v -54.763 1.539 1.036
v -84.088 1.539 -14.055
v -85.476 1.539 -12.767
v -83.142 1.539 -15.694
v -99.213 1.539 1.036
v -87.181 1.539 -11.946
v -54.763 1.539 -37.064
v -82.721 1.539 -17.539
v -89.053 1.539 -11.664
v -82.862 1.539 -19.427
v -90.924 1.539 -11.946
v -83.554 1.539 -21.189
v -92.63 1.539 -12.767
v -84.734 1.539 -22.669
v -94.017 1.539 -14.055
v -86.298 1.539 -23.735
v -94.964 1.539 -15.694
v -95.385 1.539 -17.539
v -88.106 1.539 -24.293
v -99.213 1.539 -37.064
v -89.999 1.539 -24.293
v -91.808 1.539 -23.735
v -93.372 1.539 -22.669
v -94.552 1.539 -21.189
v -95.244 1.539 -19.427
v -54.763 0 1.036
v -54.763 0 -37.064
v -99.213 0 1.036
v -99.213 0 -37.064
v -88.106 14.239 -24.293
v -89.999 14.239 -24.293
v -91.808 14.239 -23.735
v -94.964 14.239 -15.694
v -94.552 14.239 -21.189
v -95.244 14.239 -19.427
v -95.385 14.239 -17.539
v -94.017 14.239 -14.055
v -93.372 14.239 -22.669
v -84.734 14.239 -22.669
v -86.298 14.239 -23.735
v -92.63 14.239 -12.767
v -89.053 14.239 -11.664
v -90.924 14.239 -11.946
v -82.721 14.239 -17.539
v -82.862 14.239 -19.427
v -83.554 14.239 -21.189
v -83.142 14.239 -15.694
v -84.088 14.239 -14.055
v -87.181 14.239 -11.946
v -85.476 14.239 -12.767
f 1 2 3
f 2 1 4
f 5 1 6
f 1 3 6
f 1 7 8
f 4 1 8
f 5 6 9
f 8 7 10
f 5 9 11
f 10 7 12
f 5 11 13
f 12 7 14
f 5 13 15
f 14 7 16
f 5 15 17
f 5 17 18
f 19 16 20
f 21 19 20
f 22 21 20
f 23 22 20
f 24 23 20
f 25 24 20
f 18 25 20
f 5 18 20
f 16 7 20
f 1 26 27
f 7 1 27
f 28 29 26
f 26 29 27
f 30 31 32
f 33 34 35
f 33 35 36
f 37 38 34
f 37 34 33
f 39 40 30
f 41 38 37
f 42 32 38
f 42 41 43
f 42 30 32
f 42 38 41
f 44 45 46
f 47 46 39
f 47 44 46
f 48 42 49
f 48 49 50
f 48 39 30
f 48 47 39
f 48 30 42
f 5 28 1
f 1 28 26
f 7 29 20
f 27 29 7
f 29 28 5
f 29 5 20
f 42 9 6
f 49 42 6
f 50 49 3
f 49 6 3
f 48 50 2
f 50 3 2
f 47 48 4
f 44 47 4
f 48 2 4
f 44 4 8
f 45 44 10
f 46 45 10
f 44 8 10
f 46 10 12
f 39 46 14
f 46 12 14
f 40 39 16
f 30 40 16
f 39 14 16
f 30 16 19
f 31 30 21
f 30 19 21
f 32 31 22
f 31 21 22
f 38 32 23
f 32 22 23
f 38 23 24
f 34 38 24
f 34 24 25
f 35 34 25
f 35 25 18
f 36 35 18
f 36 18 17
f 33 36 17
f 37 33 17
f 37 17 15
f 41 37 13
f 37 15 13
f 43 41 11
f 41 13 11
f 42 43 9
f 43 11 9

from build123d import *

# Parameters (mm, degrees)
SKETCH1_W           = 44.45
SKETCH1_H           = 38.1
BOSS_EXTRUDE1_DEPTH = 12.7
SKETCH4_W           = 44.45
SKETCH4_H           = 11.16076
CUT_EXTRUDE1_DEPTH  = 108.033044593
SKETCH5_R           = 6.35
BOSS_EXTRUDE2_DEPTH = 12.7


with BuildPart() as part:
    # Sketch1 → Boss-Extrude1 (new body)
    with BuildSketch(Plane(origin=(0, 0, 0), x_dir=(1, 0, 0), z_dir=(0, 1, 0))):
        with Locations((-76.987764476, 18.013859456)):
            Rectangle(SKETCH1_W, SKETCH1_H)
    extrude(amount=BOSS_EXTRUDE1_DEPTH)

    # Sketch4 → Cut-Extrude1 (cut, through all)
    with BuildSketch(Plane(origin=(0, 0, -37.063859456), x_dir=(-1, 0, 0), z_dir=(0, 0, -1))):
        with Locations((76.987764476, 7.11962)):
            Rectangle(SKETCH4_W, SKETCH4_H)
    extrude(amount=-CUT_EXTRUDE1_DEPTH, mode=Mode.SUBTRACT)

    # Sketch5 → Boss-Extrude2 (add)
    with BuildSketch(Plane(origin=(0, 1.53924, 0), x_dir=(1, 0, 0), z_dir=(0, 1, 0))):
        with Locations(Location((-89.052764476, 18.013859456, 0), (0, 0, 270))):
            Circle(SKETCH5_R)
    extrude(amount=BOSS_EXTRUDE2_DEPTH)


solid = part.part
